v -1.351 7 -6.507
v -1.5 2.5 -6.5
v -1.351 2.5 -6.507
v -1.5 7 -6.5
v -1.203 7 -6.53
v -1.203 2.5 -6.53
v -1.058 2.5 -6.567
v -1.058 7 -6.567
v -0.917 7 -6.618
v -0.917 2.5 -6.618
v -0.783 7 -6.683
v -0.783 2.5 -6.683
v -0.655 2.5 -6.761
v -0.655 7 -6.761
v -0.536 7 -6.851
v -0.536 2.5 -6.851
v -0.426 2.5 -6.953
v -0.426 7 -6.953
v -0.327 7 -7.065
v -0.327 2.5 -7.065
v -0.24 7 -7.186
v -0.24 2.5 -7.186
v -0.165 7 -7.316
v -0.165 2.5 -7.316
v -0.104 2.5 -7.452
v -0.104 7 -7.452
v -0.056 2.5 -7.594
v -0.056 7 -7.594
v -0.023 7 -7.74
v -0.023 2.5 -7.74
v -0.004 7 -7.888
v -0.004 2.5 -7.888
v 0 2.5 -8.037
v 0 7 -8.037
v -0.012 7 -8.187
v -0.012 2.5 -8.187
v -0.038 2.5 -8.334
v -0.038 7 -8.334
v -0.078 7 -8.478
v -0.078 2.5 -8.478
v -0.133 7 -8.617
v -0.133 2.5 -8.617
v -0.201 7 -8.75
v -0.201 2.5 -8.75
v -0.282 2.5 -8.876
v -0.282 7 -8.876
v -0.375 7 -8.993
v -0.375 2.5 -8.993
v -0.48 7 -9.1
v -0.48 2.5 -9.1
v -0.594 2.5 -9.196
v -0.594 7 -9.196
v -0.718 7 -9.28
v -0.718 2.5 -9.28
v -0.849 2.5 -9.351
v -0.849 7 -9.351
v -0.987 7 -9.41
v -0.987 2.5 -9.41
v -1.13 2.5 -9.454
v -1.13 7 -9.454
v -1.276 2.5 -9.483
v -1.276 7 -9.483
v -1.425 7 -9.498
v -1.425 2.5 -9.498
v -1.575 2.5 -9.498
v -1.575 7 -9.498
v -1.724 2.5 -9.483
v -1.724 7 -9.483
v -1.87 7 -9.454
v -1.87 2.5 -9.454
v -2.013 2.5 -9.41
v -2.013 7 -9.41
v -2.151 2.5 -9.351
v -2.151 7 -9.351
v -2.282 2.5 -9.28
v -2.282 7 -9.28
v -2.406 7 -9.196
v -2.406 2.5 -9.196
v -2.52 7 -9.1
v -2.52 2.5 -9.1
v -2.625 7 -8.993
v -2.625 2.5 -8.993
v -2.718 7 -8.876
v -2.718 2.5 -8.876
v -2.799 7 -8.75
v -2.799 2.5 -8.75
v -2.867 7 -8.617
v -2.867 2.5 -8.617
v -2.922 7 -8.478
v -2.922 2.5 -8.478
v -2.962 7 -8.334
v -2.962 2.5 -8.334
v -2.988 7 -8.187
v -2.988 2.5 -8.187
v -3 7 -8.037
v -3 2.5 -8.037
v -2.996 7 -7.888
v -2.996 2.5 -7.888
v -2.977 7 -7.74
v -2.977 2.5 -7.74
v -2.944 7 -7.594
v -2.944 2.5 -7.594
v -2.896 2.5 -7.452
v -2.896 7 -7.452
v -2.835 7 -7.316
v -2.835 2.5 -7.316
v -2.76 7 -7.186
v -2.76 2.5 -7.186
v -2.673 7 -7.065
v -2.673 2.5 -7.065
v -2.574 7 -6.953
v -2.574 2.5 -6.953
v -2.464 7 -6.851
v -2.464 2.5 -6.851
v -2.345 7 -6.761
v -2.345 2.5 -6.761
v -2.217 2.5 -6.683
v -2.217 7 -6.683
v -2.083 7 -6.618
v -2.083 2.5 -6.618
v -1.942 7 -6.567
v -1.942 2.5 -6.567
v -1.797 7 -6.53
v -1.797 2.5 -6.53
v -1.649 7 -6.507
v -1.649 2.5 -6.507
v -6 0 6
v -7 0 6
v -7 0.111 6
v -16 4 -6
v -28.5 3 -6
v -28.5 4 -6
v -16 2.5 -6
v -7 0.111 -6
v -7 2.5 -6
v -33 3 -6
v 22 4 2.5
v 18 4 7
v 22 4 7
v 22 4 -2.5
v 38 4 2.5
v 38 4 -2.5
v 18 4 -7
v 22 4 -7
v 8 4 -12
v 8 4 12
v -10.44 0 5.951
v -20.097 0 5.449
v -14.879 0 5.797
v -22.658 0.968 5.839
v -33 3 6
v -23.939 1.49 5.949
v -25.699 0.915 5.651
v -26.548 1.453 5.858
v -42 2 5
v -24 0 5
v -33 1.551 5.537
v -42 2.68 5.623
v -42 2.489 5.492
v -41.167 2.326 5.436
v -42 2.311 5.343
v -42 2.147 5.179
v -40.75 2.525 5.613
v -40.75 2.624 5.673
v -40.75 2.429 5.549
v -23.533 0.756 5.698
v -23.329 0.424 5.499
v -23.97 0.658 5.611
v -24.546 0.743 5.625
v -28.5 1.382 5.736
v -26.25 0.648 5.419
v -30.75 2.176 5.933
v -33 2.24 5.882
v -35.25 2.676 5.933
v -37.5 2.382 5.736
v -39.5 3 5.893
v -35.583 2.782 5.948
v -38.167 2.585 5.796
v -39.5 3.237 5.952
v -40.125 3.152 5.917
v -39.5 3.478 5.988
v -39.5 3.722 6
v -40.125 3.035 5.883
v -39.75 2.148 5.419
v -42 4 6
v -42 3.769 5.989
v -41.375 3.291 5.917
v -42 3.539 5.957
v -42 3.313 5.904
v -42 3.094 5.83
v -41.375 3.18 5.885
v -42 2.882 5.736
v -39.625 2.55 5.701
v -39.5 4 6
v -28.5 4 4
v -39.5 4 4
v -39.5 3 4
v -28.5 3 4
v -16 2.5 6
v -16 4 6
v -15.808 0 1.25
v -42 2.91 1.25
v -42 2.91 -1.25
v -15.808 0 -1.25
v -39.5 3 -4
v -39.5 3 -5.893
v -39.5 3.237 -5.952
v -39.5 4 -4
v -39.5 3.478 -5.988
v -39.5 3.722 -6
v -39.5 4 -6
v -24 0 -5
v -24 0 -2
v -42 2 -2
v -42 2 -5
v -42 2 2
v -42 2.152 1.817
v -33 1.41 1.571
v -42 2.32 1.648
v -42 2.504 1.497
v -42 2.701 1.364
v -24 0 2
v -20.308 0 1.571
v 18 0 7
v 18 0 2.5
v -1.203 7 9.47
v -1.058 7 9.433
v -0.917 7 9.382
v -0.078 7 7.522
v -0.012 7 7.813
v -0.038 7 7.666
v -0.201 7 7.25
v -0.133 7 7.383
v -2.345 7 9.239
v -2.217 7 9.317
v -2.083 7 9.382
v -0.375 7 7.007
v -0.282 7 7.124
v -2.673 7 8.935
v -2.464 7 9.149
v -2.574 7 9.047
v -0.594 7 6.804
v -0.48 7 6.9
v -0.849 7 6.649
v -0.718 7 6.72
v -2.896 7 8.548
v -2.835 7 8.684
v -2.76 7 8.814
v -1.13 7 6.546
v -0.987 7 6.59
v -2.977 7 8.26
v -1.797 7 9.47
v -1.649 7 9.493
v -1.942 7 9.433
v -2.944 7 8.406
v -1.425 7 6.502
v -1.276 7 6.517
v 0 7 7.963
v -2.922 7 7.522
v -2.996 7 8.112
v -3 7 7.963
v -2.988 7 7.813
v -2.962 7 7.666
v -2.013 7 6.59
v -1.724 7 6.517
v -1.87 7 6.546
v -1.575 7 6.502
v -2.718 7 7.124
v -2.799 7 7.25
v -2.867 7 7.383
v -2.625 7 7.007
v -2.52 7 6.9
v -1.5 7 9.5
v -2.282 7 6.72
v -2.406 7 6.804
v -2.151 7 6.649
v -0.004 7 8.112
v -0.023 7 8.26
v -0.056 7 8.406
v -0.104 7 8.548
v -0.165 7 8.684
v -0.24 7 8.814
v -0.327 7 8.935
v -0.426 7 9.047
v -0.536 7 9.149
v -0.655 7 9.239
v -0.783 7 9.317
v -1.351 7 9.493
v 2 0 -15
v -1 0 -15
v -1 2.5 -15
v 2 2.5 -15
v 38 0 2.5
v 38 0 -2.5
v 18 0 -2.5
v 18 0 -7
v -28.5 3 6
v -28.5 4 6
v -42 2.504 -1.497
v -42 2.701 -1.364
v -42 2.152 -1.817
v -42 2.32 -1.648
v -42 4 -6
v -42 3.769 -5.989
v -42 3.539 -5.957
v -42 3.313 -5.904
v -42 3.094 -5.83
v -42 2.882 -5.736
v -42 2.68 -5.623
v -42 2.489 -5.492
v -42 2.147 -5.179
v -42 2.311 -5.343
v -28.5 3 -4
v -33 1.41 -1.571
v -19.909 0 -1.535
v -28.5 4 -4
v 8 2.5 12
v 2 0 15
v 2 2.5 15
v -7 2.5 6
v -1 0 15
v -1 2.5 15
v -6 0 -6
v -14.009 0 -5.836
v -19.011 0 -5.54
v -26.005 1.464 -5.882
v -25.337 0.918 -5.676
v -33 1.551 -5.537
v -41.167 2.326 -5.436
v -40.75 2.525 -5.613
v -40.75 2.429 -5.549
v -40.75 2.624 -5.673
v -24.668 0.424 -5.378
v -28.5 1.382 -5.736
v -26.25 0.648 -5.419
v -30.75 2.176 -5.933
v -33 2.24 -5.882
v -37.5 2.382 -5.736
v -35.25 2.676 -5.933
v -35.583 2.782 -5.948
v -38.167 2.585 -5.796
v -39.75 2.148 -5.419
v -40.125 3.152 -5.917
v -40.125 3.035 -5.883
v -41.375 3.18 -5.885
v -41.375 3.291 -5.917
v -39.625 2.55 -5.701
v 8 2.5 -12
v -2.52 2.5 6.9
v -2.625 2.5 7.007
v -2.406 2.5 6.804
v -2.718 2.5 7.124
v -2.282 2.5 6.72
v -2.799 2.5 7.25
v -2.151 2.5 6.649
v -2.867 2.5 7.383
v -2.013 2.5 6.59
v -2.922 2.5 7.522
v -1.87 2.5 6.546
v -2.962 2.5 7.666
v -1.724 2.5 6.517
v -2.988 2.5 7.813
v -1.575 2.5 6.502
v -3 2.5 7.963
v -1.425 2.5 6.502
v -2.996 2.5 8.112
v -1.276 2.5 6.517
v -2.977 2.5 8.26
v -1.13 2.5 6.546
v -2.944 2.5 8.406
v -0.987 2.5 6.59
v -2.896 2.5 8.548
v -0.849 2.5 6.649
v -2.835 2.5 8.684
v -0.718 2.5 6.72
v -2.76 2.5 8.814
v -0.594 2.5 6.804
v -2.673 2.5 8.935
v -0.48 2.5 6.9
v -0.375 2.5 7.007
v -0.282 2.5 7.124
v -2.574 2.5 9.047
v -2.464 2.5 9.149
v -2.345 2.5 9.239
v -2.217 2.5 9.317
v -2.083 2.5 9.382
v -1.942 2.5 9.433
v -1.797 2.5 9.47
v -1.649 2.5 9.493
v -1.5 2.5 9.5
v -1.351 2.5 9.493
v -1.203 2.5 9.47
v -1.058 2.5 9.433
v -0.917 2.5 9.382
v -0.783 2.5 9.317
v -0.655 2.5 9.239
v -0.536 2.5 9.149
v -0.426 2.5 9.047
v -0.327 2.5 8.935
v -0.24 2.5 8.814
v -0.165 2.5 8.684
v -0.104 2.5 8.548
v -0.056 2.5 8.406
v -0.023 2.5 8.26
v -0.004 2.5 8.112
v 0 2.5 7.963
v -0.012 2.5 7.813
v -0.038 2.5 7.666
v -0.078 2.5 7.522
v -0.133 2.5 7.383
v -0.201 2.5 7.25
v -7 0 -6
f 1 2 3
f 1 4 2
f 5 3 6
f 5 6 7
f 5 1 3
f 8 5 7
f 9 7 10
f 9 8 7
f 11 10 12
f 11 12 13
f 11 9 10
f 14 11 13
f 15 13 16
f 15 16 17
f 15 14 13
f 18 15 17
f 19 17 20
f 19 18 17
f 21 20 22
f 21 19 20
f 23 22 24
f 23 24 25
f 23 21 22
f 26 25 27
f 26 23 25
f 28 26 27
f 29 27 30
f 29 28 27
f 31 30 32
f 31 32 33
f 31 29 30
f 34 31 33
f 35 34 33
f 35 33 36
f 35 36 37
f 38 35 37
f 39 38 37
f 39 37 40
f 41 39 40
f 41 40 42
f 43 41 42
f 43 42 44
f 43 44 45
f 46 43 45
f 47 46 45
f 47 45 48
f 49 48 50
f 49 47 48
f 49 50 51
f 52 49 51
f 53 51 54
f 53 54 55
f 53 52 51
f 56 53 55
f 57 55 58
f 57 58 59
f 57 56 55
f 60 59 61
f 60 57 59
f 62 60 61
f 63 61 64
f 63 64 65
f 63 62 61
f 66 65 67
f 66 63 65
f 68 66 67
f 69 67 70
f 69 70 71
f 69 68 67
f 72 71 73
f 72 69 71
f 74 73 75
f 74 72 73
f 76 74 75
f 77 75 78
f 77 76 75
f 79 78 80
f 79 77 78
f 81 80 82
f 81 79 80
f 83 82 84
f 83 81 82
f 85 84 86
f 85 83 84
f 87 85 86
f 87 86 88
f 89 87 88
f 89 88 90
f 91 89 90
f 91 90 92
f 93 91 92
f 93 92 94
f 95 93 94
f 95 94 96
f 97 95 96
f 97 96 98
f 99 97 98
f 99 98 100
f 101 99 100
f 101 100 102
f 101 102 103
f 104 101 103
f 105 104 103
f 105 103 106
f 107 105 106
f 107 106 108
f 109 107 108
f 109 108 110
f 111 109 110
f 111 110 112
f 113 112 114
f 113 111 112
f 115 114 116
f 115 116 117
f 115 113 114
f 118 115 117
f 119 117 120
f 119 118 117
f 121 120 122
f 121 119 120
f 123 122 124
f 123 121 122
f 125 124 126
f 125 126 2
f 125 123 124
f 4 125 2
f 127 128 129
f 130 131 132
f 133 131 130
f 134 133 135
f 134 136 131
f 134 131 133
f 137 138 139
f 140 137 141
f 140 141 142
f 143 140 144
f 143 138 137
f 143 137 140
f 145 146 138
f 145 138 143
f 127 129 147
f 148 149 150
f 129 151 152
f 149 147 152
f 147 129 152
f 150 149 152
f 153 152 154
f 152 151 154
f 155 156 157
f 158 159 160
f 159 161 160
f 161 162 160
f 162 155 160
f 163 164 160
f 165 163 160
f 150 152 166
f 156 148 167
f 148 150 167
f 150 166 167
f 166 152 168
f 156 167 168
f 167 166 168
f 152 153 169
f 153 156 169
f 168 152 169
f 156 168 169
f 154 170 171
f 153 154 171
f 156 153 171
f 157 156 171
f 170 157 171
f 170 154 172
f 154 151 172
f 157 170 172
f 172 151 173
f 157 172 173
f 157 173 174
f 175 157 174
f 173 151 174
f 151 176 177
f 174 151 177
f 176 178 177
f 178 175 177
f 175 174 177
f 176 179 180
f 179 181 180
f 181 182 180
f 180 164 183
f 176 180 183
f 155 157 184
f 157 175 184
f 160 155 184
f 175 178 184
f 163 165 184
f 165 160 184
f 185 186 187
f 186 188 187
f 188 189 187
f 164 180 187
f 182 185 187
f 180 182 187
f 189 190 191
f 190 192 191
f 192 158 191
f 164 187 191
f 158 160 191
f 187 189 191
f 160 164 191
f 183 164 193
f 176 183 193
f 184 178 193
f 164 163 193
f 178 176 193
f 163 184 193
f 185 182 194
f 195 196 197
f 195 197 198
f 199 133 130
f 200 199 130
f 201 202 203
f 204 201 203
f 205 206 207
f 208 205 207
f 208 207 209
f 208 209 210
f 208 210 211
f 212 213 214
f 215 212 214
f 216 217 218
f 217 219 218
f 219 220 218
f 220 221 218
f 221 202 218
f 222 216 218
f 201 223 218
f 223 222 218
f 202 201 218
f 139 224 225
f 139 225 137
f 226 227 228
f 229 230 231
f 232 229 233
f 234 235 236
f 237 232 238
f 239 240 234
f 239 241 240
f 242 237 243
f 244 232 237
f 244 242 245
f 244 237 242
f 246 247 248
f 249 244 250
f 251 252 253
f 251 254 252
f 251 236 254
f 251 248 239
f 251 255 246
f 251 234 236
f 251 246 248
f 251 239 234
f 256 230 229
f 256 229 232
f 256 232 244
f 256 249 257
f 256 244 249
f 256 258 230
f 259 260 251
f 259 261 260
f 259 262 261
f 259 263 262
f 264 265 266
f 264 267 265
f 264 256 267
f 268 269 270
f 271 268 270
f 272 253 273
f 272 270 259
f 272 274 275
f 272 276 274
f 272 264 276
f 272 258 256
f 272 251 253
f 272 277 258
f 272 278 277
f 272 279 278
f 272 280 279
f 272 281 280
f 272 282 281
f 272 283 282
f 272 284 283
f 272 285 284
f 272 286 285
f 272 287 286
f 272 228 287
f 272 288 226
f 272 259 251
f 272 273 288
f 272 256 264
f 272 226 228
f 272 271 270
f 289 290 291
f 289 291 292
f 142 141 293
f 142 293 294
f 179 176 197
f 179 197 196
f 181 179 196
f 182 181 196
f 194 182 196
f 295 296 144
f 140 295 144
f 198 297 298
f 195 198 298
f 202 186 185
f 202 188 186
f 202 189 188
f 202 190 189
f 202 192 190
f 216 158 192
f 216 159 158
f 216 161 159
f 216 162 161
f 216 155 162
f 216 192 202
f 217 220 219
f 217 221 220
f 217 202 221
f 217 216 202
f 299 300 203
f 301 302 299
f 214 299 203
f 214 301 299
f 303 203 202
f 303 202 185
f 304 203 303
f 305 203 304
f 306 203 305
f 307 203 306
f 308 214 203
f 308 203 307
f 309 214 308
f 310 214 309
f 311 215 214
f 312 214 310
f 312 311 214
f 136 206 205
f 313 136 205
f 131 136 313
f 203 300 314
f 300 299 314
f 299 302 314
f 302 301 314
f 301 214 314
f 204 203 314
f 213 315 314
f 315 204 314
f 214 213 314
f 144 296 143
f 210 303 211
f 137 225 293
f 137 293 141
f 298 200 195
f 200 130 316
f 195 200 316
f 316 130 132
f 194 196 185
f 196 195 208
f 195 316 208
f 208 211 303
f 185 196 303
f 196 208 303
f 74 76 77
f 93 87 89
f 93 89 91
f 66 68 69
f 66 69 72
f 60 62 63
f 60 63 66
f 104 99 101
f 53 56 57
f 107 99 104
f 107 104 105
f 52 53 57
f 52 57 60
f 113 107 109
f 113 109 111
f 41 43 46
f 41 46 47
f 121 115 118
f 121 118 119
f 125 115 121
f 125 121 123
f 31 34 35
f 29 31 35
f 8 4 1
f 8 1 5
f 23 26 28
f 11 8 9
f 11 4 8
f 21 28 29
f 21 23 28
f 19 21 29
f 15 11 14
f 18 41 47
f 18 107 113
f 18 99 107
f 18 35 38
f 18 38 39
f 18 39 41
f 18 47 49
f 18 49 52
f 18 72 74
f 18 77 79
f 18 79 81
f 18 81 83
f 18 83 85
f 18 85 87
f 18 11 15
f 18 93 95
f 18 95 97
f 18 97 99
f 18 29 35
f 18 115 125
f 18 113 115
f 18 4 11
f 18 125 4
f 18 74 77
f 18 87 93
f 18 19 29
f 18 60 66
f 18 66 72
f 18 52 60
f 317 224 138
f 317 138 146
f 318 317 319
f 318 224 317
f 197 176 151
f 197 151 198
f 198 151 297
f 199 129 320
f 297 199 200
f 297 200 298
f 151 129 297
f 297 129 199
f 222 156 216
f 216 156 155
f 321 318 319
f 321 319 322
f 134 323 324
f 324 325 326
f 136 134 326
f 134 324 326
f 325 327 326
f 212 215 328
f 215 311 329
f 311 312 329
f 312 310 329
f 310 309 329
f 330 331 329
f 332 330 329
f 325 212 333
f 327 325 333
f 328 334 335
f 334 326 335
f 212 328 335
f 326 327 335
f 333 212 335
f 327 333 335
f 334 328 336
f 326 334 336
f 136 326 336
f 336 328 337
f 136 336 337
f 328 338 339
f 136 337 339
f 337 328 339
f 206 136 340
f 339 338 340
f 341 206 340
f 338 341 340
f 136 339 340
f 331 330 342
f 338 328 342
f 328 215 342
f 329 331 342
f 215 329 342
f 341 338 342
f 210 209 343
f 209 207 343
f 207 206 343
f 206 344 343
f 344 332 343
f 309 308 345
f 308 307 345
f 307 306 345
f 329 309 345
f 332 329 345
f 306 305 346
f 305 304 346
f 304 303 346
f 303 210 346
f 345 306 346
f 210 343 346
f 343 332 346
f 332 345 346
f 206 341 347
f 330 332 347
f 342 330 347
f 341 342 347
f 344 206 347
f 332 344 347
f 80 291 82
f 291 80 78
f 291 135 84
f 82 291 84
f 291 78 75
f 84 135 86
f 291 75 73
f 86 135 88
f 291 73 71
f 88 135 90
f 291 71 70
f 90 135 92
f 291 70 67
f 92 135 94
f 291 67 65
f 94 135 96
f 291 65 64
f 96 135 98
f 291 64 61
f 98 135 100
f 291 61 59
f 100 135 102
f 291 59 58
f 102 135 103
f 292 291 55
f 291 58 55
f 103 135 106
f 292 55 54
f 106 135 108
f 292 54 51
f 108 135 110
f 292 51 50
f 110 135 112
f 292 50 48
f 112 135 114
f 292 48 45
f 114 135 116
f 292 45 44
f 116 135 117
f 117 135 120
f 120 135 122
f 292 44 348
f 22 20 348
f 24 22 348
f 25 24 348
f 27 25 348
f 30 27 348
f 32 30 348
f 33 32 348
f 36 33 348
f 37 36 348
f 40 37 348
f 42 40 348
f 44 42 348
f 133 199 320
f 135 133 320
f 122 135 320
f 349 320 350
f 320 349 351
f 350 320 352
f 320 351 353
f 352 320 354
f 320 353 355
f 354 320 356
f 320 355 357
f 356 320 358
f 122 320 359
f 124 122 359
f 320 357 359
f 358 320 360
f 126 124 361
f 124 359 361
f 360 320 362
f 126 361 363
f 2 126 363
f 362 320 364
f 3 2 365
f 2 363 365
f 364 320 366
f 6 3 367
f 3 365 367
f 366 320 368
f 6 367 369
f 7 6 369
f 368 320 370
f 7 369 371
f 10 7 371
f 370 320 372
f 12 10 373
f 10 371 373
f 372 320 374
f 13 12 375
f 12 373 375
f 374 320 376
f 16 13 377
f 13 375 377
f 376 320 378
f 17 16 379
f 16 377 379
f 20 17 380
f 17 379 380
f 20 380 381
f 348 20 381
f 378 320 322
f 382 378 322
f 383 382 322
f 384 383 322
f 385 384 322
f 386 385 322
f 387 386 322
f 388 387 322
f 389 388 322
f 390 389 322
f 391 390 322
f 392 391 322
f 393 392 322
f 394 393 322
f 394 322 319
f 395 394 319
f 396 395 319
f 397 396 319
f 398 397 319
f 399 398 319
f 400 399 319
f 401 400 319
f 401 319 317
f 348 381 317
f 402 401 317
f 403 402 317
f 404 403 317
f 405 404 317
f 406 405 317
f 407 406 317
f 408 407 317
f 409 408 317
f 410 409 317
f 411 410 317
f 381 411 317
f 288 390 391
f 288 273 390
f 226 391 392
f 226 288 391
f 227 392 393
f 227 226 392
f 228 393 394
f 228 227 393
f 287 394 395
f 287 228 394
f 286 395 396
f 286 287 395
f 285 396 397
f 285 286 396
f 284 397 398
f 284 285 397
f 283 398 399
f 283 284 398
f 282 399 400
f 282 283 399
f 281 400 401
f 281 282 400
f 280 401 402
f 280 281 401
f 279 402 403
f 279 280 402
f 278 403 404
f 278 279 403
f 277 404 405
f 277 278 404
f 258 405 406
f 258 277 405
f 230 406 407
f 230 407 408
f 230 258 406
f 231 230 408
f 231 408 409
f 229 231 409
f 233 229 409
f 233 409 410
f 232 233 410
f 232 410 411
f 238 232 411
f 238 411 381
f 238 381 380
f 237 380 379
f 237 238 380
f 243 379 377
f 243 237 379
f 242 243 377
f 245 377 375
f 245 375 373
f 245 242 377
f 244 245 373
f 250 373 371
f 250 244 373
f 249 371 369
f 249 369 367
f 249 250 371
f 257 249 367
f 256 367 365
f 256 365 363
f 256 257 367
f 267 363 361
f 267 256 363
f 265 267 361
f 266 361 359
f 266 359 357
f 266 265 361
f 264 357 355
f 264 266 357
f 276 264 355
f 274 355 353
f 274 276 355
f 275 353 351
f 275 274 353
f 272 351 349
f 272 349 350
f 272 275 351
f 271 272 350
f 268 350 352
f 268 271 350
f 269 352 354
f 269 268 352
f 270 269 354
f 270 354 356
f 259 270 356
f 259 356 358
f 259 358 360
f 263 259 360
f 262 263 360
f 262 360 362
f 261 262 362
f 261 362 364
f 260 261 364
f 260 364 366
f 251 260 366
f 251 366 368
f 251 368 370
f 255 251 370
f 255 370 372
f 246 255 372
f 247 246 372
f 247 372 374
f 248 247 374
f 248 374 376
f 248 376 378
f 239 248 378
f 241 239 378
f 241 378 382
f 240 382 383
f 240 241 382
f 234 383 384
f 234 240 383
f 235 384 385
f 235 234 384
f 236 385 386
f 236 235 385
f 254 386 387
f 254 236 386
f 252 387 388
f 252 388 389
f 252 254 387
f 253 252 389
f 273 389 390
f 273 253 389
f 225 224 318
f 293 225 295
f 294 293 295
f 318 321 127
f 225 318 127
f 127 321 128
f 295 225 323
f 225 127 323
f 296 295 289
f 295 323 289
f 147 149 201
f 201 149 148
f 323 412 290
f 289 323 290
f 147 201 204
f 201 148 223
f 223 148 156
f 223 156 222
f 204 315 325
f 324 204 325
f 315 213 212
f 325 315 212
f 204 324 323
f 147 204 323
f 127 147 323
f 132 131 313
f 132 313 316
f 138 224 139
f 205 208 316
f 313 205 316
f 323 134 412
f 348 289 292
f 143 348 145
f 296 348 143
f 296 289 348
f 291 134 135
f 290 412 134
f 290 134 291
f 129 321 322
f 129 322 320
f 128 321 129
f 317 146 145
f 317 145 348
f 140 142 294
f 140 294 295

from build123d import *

# Parameters (mm, degrees)
BOSS_EXTRUDE1_DEPTH = 4
SKETCH2_R           = 1.5
BOSS_EXTRUDE2_DEPTH = 3
CUT_EXTRUDE1_DEPTH  = 13
CUT_EXTRUDE2_DEPTH  = 49
CUT_EXTRUDE3_DEPTH  = 37
SKETCH6_R           = 1.5
BOSS_EXTRUDE3_DEPTH = 5
SKETCH7_W           = 11
SKETCH7_H           = 1
CUT_EXTRUDE4_DEPTH  = 2
CUT_EXTRUDE5_START  = -12
SKETCH7_2_W         = 11
SKETCH7_2_H         = 1
CUT_EXTRUDE5_DEPTH  = 2
SKETCH8_W           = 14
SKETCH8_H           = 4
BOSS_EXTRUDE4_DEPTH = 3
SKETCH9_W           = 5
SKETCH9_H           = 4
BOSS_EXTRUDE5_DEPTH = 12
CUT_EXTRUDE6_DEPTH  = 4.5
CUT_EXTRUDE7_START  = -14
CUT_EXTRUDE7_DEPTH  = 4.5


with BuildPart() as part:
    # Sketch1 → Boss-Extrude1 (new body)
    with BuildSketch(Plane(origin=(0, 0, 0), x_dir=(1, 0, 0), z_dir=(0, 1, 0))):
        Polygon((-1, 15), (2, 15), (18, 7), (23, 7), (23, -7), (18, -7), (2, -15), (-1, -15), (-7, -6), (-42, -6), (-42, 6), (-7, 6), align=None)
    extrude(amount=BOSS_EXTRUDE1_DEPTH)

    # Sketch2 → Boss-Extrude2 (add)
    with BuildSketch(Plane(origin=(0, 4, 0), x_dir=(1, 0, 0), z_dir=(0, 1, 0))):
        with Locations(Location((-1.5, 8, 0), (0, 0, 270))):
            Circle(SKETCH2_R)
        with Locations(Location((-1.5, -8, 0), (0, 0, 90))):
            Circle(SKETCH2_R)
    extrude(amount=BOSS_EXTRUDE2_DEPTH)

    # Sketch3 → Cut-Extrude1 (cut)
    with BuildSketch(Plane.XY.offset(6)):
        Polygon((-24, 0), (-42, 2), (-42, 0), align=None)
    extrude(amount=-CUT_EXTRUDE1_DEPTH, mode=Mode.SUBTRACT)

    # Sketch4 → Cut-Extrude2 (cut, along a direction that is not the sketch's normal)
    with BuildSketch(Plane.ZY.offset(42)):
        with BuildLine():
            ThreePointArc((-5, 2), (-5.736067977, 2.881966011), (-6, 4))
            Line((-6, 4), (-6, 2))
            Line((-6, 2), (-5, 2))
        make_face()
        with BuildLine():
            Line((1.25, 2.910275264), (-1.25, 2.910275264))
            ThreePointArc((-1.25, 2.910275264), (-1.570550528, 2.410275264), (-2, 2))
            Line((-2, 2), (2, 2))
            ThreePointArc((2, 2), (1.570550528, 2.410275264), (1.25, 2.910275264))
        make_face()
        with BuildLine():
            Line((5, 2), (6, 2))
            Line((6, 2), (6, 4))
            ThreePointArc((6, 4), (5.736067977, 2.881966011), (5, 2))
        make_face()
    extrude(amount=-CUT_EXTRUDE2_DEPTH, dir=(-0.9938837346736189, 0.11043152607484653, 0), mode=Mode.SUBTRACT)

    # Sketch5 → Cut-Extrude3 (cut)
    with BuildSketch(Plane.XY.offset(15)):
        Polygon((-7, 4), (8, 4), (8, 2.5), (-7, 2.5), (-16, 2.5), (-16, 4), align=None)
    extrude(amount=-CUT_EXTRUDE3_DEPTH, mode=Mode.SUBTRACT)


with BuildPart() as cut_extrude3_piece_1:
    # of the separate pieces the step leaves, piece 1, a body of its own (cut_extrude3_pieces)
    add(part.part.solids().sort_by_distance((-1, 0, -15))[0])



with BuildPart() as cut_extrude3_piece_2:
    # of the separate pieces the step leaves, piece 2, a body of its own (cut_extrude3_pieces)
    add(part.part.solids().sort_by_distance((-1.5, 4, -6.5))[0])


with BuildPart() as cut_extrude3_piece_3:
    # of the separate pieces the step leaves, piece 3, a body of its own (cut_extrude3_pieces)
    add(part.part.solids().sort_by_distance((-1.5, 4, 6.5))[0])


with BuildPart() as cut_extrude3_piece_1_1:
    add(cut_extrude3_piece_1.part)

    add(cut_extrude3_piece_2.part)  # Boss-Extrude3 merges Cut-Extrude3 piece 2

    add(cut_extrude3_piece_3.part)  # Boss-Extrude3 merges Cut-Extrude3 piece 3
    # Sketch6 → Boss-Extrude3 (add)
    with BuildSketch(Plane(origin=(0, 7, 0), x_dir=(1, 0, 0), z_dir=(0, 1, 0))):
        with Locations(Location((-1.5, -8, 0), (0, 0, 270))):
            Circle(SKETCH6_R)
        with Locations(Location((-1.5, 8, 0), (0, 0, 270))):
            Circle(SKETCH6_R)
    extrude(amount=-BOSS_EXTRUDE3_DEPTH)

    # Sketch7 → Cut-Extrude4 (cut)
    with BuildSketch(Plane.XY.offset(6)):
        with Locations((-34, 3.5)):
            Rectangle(SKETCH7_W, SKETCH7_H)
    extrude(amount=-CUT_EXTRUDE4_DEPTH, mode=Mode.SUBTRACT)

    # Sketch7<2> → Cut-Extrude5 (cut)
    with BuildSketch(Plane.XY.offset(6).offset(CUT_EXTRUDE5_START)):
        with Locations((-34, 3.5)):
            Rectangle(SKETCH7_2_W, SKETCH7_2_H)
    extrude(amount=CUT_EXTRUDE5_DEPTH, mode=Mode.SUBTRACT)

    # Sketch8 → Boss-Extrude4 (add)
    with BuildSketch(Plane(origin=(23, 0, 0), x_dir=(0, 0, -1), z_dir=(1, 0, 0))):
        with Locations((0, 2)):
            Rectangle(SKETCH8_W, SKETCH8_H)
    extrude(amount=BOSS_EXTRUDE4_DEPTH)

    # Sketch9 → Boss-Extrude5 (add)
    with BuildSketch(Plane(origin=(26, 0, 0), x_dir=(0, 0, -1), z_dir=(1, 0, 0))):
        with Locations((0, 2)):
            Rectangle(SKETCH9_W, SKETCH9_H)
    extrude(amount=BOSS_EXTRUDE5_DEPTH)

    # Sketch10 → Cut-Extrude6 (cut)
    with BuildSketch(Plane.XY.offset(7)):
        Polygon((18, 0), (22, 4), (26, 4), (26, 0), align=None)
    extrude(amount=-CUT_EXTRUDE6_DEPTH, mode=Mode.SUBTRACT)

    # Sketch10<3> → Cut-Extrude7 (cut)
    with BuildSketch(Plane.XY.offset(7).offset(CUT_EXTRUDE7_START)):
        Polygon((18, 0), (22, 4), (26, 4), (26, 0), align=None)
    extrude(amount=CUT_EXTRUDE7_DEPTH, mode=Mode.SUBTRACT)


solid = cut_extrude3_piece_1_1.part
